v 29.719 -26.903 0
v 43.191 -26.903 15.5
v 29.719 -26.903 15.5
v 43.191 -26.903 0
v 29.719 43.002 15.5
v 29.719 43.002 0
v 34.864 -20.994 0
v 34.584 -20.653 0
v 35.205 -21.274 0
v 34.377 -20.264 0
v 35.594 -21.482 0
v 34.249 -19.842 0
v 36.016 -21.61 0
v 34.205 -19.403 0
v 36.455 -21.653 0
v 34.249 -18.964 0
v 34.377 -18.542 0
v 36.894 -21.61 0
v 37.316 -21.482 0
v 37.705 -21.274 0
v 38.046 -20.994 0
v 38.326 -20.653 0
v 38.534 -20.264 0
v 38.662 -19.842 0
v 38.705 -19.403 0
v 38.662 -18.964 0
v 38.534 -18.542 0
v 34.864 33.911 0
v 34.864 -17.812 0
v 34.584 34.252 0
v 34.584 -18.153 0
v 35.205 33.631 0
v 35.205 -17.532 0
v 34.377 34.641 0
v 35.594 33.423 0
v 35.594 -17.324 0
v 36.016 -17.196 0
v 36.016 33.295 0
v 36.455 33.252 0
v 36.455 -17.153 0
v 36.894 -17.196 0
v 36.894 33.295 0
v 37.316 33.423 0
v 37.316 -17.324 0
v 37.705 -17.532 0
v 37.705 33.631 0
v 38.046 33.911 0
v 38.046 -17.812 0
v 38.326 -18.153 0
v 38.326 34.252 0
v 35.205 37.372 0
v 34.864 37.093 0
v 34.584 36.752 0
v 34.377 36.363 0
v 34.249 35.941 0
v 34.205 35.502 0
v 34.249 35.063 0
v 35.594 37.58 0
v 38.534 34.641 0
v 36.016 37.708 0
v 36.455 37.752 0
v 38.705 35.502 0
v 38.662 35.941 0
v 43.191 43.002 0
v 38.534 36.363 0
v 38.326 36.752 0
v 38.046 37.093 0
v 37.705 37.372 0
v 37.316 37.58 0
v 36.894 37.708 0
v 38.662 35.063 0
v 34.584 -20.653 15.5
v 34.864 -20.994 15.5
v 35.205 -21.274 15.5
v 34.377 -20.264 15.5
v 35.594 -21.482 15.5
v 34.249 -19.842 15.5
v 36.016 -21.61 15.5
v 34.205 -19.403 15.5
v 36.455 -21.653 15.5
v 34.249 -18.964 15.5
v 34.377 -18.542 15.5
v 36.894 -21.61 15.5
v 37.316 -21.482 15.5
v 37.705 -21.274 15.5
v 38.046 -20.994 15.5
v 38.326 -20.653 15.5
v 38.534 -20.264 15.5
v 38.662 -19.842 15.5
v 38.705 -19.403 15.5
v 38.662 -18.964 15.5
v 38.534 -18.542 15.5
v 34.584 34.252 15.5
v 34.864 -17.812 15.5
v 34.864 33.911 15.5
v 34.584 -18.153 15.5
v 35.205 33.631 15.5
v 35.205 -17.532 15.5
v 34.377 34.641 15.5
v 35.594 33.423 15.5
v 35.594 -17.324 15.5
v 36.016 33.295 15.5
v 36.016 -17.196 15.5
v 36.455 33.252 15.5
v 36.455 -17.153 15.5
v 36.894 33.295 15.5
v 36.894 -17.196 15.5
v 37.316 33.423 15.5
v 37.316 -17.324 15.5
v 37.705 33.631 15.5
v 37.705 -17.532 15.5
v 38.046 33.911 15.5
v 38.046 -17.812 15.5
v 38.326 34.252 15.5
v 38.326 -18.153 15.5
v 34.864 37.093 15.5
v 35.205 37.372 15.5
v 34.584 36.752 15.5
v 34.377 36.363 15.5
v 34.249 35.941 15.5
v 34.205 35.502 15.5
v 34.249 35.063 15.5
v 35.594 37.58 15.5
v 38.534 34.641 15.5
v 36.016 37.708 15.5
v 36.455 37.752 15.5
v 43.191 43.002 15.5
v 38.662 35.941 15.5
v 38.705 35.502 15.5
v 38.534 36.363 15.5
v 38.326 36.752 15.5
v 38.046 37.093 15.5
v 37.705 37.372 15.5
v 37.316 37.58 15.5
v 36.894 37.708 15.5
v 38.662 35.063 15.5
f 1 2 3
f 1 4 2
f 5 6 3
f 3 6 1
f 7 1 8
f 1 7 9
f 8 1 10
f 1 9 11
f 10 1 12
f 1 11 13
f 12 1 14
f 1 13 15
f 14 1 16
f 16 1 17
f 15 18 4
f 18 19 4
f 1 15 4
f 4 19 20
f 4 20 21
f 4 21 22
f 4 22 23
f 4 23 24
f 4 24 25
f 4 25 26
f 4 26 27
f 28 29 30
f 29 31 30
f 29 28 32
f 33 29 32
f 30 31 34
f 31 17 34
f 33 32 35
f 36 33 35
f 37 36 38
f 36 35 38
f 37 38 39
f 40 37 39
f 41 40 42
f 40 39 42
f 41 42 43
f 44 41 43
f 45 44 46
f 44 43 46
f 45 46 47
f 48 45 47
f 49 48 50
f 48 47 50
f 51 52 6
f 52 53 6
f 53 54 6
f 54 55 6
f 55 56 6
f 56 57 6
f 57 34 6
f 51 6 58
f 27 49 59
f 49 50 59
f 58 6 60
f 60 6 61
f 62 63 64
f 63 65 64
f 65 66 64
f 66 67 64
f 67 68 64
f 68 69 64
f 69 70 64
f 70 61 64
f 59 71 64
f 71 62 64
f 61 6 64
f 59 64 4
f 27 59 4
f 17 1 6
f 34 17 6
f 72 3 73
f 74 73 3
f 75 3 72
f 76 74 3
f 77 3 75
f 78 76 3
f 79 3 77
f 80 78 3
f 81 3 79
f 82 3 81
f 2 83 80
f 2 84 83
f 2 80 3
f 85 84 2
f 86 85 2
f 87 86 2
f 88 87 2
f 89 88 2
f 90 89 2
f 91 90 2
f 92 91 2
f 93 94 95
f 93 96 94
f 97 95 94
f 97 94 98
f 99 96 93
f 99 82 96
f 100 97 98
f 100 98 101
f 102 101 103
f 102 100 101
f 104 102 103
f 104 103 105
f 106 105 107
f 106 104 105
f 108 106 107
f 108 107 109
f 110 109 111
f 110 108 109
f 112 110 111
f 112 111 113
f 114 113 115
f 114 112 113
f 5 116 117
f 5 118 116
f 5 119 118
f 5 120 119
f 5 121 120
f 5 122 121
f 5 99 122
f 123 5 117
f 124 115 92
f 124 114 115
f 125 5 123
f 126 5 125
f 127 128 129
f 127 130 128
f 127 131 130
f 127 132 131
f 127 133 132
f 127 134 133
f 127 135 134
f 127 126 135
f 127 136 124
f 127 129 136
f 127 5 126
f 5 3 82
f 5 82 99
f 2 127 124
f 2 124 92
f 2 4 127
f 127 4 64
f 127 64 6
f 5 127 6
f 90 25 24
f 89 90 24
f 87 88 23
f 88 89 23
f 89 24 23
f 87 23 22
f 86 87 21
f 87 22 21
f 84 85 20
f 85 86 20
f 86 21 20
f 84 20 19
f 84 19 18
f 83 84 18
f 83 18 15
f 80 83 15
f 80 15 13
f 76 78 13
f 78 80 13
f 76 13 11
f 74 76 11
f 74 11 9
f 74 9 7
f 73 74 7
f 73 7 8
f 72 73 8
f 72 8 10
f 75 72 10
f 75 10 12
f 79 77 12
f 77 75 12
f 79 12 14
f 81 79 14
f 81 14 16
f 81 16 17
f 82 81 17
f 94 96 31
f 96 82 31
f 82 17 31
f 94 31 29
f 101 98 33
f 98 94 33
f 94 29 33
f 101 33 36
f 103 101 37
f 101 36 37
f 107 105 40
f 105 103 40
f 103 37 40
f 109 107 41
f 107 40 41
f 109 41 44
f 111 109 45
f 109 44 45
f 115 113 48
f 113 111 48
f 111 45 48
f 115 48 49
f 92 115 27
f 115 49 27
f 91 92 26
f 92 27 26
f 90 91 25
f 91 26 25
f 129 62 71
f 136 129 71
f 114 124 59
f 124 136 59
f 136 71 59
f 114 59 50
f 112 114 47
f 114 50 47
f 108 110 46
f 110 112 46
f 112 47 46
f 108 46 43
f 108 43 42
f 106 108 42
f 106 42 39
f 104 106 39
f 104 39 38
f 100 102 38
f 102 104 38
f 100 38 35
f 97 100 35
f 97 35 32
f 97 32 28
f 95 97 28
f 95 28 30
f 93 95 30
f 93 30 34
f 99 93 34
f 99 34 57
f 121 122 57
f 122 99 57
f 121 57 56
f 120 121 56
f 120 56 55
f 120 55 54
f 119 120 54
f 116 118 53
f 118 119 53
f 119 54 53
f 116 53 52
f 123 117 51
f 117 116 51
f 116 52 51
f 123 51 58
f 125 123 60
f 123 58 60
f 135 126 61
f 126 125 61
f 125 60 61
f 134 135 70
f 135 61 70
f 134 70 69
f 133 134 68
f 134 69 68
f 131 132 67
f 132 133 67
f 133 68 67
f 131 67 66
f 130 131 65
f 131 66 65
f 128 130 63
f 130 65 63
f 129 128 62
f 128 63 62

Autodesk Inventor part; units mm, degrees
ref_plane "YZ Plane" through (0, 0, 0) normal (1, 0, 0) x (0, 1, 0)
ref_plane "XZ Plane" through (0, 0, 0) normal (0, 1, 0) x (-1, 0, 0)
ref_plane "XY Plane" through (0, 0, 0) normal (0, 0, 1) x (1, 0, 0)
ref_plane "Plan de construction1" through (0, 0, 0) normal (0, 0, 1) x (1, 0, 0)
sketch "Esquisse1" plane through (0, 0, 0) normal (0, 0, 1) x (1, 0, 0)
  circle A0 centre (36.4553, 35.5016) radius 2.25 projected
  line L0 (29.7194, 25.7651) -> (43.1911, 25.7651) projected
  line L1 (43.1911, 25.7651) -> (43.1911, 43.0016) projected
  line L2 (43.1911, 43.0016) -> (29.7194, 43.0016) projected
  line L3 (29.7194, 43.0016) -> (29.7194, 25.7651) projected
  circle A1 centre (36.4553, -19.4032) radius 2.25 projected
  circle A2 centre (36.4553, 35.5016) radius 2.25 projected
  circle A3 centre (25.0518, -6.7548) radius 2.15 projected
  circle A4 centre (25.0518, 23.2452) radius 2.15 projected
  line L4 (43.1911, 43.0016) -> (43.1911, -26.9032) projected
  line L5 (29.7194, 43.0016) -> (43.1911, 43.0016) projected
  line L6 (29.7194, 28.2452) -> (29.7194, 43.0016) projected
  line L7 (29.7194, 28.2452) -> (19.7194, 28.2452) projected
  line L8 (19.7194, 28.2452) -> (19.7194, 19.2452) projected
  line L9 (19.7194, 19.2452) -> (38.63, 19.2452) projected
  line L10 (38.63, 19.2452) -> (38.63, -2.9032) projected
  line L11 (38.63, -2.9032) -> (19.7194, -2.9032) projected
  line L12 (19.7194, -2.9032) -> (19.7194, -11.9032) projected
  line L13 (19.7194, -11.9032) -> (29.7194, -11.9032) projected
  line L14 (29.7194, -26.9032) -> (29.7194, -11.9032) projected
  line L15 (43.1911, -26.9032) -> (29.7194, -26.9032) projected
  line L16 (43.1911, 43.0016) -> (29.7194, 43.0016)
  line L17 (29.7194, 43.0016) -> (29.7194, -26.9032)
  line L18 (29.7194, -26.9032) -> (43.1911, -26.9032)
  line L19 (43.1911, -26.9032) -> (43.1911, 43.0016)
  point P0 (0, 0)
extrude "Extrusion1" add sketch "Esquisse1" along normal blind 15.5 contours L3 L2 L1 L0 | L0 L4 L15 L14 L17 L11 L10 L9 | L9 L10 L11 L17
properties part number "tg"
